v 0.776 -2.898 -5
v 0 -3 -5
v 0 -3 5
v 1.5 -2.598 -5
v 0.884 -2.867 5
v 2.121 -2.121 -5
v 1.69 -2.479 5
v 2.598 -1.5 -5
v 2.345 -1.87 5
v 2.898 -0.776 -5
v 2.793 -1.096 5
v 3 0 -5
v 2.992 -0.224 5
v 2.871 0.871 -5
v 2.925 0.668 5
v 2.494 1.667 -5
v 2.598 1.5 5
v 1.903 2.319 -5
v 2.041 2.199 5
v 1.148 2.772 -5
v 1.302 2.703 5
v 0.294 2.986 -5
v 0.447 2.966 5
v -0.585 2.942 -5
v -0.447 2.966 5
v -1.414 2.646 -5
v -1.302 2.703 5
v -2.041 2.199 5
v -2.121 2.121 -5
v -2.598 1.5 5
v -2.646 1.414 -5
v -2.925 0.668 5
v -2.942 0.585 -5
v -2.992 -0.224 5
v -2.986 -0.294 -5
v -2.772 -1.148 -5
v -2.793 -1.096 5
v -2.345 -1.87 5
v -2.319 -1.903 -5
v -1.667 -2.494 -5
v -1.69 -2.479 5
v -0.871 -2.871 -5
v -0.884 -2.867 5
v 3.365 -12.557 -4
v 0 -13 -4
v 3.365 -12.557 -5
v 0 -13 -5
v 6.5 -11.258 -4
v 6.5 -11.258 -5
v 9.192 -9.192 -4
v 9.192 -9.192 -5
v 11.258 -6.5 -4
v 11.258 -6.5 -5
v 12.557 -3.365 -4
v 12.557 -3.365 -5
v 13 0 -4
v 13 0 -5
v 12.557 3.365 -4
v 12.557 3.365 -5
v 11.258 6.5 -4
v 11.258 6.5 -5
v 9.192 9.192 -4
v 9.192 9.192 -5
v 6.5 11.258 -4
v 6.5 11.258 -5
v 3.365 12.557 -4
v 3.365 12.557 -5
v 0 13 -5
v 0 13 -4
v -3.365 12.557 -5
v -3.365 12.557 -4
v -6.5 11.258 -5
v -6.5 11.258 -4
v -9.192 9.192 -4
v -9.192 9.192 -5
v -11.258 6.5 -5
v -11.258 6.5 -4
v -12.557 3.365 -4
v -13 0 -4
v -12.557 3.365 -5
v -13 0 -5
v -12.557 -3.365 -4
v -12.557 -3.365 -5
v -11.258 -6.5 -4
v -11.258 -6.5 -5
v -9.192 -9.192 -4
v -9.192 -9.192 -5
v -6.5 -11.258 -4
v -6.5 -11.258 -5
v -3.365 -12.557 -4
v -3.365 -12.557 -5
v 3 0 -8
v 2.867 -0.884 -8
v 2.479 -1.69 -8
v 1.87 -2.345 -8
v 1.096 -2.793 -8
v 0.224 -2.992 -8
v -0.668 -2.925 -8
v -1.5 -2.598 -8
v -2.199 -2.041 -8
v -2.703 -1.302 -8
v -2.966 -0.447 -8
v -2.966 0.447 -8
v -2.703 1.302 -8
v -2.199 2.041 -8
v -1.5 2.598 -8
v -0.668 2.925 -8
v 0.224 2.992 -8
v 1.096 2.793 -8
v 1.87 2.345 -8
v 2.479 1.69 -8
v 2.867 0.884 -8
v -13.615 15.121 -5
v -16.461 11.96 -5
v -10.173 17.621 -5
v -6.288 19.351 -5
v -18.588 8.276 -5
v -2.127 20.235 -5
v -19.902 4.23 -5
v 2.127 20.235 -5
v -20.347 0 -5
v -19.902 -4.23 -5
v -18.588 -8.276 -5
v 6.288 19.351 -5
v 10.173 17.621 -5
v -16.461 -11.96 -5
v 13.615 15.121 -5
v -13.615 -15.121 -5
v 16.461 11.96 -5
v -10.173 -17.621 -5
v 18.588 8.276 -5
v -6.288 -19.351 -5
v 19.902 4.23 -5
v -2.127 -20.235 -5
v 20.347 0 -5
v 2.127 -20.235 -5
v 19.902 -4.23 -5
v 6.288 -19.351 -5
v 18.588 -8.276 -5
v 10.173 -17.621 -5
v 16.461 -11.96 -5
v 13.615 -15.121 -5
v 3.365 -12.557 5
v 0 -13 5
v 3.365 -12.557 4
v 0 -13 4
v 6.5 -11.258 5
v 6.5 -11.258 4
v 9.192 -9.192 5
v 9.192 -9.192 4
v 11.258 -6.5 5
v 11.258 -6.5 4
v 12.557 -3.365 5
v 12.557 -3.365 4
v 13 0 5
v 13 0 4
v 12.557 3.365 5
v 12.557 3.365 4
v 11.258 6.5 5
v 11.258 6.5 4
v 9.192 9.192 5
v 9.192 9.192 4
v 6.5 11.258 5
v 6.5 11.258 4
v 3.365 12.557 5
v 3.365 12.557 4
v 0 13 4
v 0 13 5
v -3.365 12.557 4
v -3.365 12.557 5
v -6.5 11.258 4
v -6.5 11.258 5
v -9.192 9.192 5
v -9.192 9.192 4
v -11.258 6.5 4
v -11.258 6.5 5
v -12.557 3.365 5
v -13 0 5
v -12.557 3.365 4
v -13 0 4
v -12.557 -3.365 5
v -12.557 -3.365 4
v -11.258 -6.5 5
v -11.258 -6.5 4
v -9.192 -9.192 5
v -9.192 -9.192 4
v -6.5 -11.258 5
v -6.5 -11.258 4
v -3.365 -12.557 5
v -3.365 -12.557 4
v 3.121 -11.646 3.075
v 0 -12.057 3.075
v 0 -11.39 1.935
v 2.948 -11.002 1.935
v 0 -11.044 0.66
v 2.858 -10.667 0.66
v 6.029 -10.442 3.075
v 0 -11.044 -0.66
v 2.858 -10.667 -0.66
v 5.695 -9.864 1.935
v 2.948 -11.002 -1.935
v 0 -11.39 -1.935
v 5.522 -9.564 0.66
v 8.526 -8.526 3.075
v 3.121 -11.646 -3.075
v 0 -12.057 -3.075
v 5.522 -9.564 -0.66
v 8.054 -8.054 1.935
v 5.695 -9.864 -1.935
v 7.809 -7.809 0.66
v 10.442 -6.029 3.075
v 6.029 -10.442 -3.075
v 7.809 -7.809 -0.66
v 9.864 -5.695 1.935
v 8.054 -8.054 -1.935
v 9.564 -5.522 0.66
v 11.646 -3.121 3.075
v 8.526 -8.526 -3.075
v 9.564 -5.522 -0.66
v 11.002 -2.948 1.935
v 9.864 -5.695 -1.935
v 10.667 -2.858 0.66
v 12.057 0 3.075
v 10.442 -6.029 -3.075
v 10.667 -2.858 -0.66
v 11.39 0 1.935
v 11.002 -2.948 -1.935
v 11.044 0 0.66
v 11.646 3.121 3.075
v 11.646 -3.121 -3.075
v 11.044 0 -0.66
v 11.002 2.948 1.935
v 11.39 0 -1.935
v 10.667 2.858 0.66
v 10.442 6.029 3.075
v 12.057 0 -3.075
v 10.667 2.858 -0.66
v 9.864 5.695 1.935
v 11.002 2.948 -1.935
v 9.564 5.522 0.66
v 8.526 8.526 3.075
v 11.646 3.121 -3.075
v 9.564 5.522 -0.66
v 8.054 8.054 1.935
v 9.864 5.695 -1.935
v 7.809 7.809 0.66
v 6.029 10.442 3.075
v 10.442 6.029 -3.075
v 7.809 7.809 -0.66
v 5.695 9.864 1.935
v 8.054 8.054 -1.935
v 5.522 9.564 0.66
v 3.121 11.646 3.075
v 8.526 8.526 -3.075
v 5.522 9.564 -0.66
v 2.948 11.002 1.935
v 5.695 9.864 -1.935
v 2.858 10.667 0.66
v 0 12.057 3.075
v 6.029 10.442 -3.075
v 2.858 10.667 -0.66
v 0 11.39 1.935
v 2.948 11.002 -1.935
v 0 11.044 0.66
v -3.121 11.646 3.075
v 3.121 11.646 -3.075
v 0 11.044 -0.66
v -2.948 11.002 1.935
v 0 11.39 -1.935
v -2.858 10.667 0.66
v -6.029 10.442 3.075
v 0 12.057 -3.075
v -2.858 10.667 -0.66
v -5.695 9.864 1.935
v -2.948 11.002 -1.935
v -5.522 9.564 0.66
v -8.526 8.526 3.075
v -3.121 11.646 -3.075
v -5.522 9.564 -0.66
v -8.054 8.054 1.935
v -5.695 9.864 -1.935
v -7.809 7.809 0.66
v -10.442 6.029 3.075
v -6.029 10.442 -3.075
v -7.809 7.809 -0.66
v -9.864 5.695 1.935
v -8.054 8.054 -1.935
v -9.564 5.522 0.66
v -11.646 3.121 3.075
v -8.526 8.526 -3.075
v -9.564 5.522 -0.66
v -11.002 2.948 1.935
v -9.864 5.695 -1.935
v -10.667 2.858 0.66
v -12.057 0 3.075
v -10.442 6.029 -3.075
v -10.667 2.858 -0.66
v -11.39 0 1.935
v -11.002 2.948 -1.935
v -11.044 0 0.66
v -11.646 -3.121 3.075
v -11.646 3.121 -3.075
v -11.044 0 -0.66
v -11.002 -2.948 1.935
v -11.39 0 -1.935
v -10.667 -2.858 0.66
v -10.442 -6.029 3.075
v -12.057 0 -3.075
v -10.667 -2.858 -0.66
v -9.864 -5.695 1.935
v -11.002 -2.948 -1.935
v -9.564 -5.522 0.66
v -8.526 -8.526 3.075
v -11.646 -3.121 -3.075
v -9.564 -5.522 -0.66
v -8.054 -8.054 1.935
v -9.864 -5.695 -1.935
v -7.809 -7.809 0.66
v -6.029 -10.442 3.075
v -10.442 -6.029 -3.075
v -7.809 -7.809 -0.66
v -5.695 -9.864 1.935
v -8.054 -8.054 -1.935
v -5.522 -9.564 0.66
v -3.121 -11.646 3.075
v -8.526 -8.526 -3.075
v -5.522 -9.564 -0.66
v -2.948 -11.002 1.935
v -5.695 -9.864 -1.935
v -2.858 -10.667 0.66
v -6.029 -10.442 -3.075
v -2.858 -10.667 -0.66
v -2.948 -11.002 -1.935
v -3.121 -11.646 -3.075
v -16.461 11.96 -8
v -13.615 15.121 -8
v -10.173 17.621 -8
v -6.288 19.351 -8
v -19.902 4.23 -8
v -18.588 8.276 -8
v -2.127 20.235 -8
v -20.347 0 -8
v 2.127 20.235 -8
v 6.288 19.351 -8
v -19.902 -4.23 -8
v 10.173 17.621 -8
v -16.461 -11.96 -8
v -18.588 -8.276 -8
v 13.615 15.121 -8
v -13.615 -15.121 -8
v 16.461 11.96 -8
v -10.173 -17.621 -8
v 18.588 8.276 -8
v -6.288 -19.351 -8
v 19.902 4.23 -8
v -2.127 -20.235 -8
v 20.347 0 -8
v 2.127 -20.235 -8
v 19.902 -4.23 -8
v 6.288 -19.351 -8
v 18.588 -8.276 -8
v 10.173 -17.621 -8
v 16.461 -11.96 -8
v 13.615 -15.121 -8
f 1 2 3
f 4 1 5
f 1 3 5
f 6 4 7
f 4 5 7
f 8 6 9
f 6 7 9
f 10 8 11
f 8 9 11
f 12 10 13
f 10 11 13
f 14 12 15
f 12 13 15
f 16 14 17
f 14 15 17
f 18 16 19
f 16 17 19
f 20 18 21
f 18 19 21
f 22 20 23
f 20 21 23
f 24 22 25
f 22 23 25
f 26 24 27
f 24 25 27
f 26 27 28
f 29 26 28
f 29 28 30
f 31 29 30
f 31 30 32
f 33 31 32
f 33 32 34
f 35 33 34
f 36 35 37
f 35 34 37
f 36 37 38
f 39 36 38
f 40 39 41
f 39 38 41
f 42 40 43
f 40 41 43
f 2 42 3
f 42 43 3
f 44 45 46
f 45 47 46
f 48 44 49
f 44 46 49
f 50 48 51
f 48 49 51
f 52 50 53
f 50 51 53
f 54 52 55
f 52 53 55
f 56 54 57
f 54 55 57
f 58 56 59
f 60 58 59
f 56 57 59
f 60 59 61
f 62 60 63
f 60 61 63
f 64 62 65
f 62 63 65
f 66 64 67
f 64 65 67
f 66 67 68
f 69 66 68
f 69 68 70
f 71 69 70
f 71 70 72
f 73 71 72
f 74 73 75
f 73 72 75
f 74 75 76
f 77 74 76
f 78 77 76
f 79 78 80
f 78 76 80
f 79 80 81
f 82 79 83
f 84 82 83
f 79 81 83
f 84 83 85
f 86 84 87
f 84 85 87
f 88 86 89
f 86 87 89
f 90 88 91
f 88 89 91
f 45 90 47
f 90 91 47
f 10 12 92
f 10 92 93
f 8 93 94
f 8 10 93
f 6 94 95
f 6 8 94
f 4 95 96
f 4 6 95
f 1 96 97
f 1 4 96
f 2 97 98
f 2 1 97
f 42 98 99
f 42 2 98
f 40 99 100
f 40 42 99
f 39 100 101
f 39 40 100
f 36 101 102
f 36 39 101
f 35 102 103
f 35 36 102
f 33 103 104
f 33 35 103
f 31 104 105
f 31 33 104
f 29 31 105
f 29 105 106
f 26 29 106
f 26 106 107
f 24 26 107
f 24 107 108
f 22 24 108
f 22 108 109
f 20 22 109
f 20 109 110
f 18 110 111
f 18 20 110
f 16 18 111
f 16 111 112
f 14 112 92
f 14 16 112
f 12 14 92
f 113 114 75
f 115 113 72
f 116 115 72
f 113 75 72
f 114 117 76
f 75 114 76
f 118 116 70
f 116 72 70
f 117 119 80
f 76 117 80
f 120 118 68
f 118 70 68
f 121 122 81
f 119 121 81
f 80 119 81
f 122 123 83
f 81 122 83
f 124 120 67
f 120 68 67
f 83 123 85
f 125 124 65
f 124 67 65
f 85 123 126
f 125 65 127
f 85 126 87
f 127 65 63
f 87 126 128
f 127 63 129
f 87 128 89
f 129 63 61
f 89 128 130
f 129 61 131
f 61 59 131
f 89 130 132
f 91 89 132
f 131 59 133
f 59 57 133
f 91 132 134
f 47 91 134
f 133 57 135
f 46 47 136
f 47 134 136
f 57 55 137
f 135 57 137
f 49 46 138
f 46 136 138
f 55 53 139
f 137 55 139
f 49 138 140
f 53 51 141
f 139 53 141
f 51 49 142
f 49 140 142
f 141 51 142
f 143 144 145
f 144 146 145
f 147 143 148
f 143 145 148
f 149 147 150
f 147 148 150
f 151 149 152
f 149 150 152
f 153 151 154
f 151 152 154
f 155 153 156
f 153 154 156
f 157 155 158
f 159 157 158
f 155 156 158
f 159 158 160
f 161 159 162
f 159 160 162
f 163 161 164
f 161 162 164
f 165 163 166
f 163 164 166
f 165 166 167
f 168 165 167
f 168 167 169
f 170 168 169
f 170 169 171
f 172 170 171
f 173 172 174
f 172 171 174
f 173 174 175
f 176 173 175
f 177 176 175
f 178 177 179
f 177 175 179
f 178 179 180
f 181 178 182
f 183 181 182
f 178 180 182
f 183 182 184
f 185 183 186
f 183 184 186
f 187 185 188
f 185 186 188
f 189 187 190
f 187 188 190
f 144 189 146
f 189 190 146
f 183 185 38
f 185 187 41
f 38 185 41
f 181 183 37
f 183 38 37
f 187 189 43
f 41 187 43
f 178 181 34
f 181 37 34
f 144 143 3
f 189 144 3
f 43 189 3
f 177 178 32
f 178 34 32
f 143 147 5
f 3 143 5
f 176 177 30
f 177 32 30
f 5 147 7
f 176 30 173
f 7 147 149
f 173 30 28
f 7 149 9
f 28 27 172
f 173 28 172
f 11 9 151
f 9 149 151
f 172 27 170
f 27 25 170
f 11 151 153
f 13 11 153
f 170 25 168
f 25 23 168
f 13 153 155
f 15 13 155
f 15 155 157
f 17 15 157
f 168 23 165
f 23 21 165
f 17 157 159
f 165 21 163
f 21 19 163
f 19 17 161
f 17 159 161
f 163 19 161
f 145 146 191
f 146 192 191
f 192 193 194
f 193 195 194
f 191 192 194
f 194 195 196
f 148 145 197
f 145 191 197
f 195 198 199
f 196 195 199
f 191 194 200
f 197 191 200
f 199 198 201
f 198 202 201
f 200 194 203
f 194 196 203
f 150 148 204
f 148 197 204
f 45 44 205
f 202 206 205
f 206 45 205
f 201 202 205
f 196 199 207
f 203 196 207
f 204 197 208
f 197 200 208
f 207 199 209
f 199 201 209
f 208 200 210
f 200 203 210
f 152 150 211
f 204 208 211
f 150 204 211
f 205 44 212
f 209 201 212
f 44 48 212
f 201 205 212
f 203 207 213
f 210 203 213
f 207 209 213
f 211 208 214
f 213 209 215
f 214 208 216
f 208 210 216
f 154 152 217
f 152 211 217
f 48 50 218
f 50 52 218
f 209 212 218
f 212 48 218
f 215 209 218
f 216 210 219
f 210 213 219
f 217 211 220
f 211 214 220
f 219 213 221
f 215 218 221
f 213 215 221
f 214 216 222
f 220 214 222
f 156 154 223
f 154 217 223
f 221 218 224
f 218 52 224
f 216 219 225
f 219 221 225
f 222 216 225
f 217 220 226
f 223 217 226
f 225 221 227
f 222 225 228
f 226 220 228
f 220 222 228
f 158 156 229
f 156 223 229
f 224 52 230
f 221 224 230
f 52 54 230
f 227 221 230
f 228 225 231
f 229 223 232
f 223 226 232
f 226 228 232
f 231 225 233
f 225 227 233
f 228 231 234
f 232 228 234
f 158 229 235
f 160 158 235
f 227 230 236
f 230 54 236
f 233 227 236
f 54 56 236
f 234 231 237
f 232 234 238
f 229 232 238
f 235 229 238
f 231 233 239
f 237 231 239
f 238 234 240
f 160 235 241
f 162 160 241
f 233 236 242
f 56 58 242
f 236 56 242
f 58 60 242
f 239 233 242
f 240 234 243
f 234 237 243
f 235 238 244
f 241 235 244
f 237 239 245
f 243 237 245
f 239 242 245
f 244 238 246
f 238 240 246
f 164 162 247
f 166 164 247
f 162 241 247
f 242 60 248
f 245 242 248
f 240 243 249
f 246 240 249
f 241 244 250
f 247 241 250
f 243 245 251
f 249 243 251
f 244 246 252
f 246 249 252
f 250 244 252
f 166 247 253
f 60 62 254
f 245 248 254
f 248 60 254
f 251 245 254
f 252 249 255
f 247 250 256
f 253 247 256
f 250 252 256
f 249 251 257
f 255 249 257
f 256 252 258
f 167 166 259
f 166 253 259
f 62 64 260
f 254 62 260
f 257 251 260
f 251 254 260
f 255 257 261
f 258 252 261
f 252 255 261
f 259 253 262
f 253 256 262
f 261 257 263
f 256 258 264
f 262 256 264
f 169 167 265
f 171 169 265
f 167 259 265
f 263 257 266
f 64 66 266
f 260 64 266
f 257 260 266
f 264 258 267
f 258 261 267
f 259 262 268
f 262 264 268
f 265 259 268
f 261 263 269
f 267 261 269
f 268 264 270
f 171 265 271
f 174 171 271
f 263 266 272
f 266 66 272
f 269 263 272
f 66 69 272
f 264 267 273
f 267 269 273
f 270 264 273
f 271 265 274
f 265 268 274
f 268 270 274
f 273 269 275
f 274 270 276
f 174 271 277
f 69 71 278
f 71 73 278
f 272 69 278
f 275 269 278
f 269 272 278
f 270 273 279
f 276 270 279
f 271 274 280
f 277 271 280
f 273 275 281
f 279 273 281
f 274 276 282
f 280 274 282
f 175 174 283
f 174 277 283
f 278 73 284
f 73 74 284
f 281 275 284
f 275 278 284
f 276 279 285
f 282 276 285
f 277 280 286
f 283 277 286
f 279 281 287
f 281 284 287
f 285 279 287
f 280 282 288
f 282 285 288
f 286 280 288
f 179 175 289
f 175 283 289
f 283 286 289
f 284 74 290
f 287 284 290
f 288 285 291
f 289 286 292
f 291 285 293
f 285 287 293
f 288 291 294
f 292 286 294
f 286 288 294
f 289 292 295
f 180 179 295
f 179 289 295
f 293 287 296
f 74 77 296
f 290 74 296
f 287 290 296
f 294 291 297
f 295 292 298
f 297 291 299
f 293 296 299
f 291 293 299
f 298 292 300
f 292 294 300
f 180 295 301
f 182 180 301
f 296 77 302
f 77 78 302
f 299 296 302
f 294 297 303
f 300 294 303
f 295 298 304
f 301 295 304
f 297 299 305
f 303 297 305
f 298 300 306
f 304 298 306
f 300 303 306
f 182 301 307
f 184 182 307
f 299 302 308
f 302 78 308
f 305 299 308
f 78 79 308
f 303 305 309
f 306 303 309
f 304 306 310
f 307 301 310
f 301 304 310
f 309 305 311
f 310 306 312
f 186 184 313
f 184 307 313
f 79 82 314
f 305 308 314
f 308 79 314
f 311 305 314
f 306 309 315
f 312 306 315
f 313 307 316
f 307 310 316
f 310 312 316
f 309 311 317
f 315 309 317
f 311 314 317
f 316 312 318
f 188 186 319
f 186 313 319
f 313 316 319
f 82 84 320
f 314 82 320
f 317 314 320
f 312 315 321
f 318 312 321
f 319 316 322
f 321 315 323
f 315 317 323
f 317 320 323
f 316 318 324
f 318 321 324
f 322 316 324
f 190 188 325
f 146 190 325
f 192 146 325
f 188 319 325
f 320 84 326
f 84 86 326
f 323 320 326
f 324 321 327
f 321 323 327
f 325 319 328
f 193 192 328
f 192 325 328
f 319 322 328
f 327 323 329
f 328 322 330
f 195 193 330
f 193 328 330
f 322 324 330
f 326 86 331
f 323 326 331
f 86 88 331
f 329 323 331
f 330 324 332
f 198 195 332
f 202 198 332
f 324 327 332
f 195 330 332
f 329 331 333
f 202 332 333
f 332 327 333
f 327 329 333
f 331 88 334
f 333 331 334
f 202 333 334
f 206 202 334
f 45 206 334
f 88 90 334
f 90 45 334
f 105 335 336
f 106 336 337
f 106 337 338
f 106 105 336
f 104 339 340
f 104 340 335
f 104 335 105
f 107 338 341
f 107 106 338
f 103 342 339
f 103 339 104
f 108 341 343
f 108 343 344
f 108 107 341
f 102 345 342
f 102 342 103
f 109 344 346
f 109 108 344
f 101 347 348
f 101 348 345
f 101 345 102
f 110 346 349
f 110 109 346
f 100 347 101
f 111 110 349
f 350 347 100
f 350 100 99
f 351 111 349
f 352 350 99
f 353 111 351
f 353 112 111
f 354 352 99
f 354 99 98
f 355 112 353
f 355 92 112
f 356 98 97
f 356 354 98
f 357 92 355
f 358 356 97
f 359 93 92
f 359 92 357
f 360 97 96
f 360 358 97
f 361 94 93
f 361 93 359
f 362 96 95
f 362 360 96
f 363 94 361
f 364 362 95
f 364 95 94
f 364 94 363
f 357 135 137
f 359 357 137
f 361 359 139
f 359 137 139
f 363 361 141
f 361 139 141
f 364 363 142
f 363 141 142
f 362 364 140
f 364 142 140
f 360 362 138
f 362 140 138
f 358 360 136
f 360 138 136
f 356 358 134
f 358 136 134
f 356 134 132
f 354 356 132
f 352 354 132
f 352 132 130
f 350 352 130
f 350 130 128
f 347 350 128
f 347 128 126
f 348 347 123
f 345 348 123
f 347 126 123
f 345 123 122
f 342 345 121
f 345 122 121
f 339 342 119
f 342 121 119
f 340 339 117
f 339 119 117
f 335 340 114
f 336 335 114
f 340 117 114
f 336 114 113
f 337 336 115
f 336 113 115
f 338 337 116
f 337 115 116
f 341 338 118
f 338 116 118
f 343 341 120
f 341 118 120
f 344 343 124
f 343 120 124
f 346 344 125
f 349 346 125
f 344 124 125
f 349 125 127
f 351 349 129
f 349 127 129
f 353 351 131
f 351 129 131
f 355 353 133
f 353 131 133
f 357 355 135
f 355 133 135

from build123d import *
from build123d import SkipClean  # not in build123d's __all__

# Parameters (mm, degrees)
F2_R     = 20.3469556015
F2_R_2   = 13
F2_R_3   = 3
F3_DEPTH = 3


with BuildPart() as f1:
    # F0 (on Right) → F1 (revolve)
    with BuildSketch(Plane.YZ):
        with BuildLine():
            Line((-3, -5), (-3, 0))
            Line((-3, 0), (-3, 5))
            Line((-3, 5), (-13, 5))
            Line((-13, 5), (-13, 4))
            ThreePointArc((-13, 4), (-11, 0), (-13, -4))
            Line((-13, -4), (-13, -5))
            Line((-13, -5), (-3, -5))
        make_face()
    revolve(axis=Axis((0, 0, 3.2237173374), (0, 0, 1)))

    # F2 (on face) → F3 (join)
    with BuildSketch(Plane(origin=(0, 0, -5), x_dir=(1, 0, 0), z_dir=(0, 0, -1))):
        Circle(F2_R)
        Circle(F2_R_2, mode=Mode.SUBTRACT)
        Circle(F2_R_2)
        Circle(F2_R_3, mode=Mode.SUBTRACT)
    with SkipClean():  # cleaning this boolean's faces spoils the solid; the shape is the same uncleaned
        extrude(amount=F3_DEPTH)


solid = f1.part
